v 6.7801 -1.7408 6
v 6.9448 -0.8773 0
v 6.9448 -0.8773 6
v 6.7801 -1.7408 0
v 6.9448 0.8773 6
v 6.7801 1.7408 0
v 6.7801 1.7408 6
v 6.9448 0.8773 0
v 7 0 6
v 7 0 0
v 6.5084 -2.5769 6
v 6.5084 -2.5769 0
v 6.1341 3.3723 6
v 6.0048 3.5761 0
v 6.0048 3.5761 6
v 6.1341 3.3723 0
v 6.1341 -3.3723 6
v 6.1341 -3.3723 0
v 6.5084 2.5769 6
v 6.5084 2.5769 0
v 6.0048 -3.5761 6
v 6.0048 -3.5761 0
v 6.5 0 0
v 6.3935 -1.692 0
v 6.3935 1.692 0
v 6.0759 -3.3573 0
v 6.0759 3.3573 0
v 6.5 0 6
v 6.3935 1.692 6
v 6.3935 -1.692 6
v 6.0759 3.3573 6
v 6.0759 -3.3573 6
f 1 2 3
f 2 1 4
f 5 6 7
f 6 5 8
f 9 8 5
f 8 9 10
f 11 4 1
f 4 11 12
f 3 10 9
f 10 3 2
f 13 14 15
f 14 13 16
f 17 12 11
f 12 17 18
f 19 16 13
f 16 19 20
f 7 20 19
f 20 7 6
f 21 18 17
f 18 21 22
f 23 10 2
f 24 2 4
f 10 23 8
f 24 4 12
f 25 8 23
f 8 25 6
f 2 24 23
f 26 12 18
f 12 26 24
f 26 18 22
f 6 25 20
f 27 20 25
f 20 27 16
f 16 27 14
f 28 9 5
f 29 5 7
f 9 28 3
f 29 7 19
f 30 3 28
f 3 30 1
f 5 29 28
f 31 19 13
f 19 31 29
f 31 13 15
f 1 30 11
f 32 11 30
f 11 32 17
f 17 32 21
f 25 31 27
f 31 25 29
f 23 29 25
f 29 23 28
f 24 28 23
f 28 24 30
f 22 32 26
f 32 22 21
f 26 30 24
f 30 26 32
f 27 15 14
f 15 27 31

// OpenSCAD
$fn = 50;


difference() {
	union() {
		cylinder(h = 6, r = 7.0000000000);
		translate(v = [-10.0000000000, 0, 0]) {
			cylinder(h = 6, r = 7.0000000000);
		}
	}
	union() {
		cylinder(h = 6, r = 3.2500000000);
		cylinder(h = 6, r = 1.8000000000);
		cylinder(h = 6, r = 1.8000000000);
		cylinder(h = 6, r = 1.8000000000);
		translate(v = [-14.5000000000, 0, 0]) {
			hull() {
				translate(v = [-3.7500000000, 0.0000000000, 0]) {
					cylinder(h = 6, r = 7.5000000000);
				}
				translate(v = [3.7500000000, 0.0000000000, 0]) {
					cylinder(h = 6, r = 7.5000000000);
				}
				translate(v = [-3.7500000000, -0.0000000000, 0]) {
					cylinder(h = 6, r = 7.5000000000);
				}
				translate(v = [3.7500000000, -0.0000000000, 0]) {
					cylinder(h = 6, r = 7.5000000000);
				}
			}
		}
		translate(v = [-7.0000000000, 0, 0.0000000000]) {
			cylinder(h = 6, r = 13.5000000000);
		}
	}
}
